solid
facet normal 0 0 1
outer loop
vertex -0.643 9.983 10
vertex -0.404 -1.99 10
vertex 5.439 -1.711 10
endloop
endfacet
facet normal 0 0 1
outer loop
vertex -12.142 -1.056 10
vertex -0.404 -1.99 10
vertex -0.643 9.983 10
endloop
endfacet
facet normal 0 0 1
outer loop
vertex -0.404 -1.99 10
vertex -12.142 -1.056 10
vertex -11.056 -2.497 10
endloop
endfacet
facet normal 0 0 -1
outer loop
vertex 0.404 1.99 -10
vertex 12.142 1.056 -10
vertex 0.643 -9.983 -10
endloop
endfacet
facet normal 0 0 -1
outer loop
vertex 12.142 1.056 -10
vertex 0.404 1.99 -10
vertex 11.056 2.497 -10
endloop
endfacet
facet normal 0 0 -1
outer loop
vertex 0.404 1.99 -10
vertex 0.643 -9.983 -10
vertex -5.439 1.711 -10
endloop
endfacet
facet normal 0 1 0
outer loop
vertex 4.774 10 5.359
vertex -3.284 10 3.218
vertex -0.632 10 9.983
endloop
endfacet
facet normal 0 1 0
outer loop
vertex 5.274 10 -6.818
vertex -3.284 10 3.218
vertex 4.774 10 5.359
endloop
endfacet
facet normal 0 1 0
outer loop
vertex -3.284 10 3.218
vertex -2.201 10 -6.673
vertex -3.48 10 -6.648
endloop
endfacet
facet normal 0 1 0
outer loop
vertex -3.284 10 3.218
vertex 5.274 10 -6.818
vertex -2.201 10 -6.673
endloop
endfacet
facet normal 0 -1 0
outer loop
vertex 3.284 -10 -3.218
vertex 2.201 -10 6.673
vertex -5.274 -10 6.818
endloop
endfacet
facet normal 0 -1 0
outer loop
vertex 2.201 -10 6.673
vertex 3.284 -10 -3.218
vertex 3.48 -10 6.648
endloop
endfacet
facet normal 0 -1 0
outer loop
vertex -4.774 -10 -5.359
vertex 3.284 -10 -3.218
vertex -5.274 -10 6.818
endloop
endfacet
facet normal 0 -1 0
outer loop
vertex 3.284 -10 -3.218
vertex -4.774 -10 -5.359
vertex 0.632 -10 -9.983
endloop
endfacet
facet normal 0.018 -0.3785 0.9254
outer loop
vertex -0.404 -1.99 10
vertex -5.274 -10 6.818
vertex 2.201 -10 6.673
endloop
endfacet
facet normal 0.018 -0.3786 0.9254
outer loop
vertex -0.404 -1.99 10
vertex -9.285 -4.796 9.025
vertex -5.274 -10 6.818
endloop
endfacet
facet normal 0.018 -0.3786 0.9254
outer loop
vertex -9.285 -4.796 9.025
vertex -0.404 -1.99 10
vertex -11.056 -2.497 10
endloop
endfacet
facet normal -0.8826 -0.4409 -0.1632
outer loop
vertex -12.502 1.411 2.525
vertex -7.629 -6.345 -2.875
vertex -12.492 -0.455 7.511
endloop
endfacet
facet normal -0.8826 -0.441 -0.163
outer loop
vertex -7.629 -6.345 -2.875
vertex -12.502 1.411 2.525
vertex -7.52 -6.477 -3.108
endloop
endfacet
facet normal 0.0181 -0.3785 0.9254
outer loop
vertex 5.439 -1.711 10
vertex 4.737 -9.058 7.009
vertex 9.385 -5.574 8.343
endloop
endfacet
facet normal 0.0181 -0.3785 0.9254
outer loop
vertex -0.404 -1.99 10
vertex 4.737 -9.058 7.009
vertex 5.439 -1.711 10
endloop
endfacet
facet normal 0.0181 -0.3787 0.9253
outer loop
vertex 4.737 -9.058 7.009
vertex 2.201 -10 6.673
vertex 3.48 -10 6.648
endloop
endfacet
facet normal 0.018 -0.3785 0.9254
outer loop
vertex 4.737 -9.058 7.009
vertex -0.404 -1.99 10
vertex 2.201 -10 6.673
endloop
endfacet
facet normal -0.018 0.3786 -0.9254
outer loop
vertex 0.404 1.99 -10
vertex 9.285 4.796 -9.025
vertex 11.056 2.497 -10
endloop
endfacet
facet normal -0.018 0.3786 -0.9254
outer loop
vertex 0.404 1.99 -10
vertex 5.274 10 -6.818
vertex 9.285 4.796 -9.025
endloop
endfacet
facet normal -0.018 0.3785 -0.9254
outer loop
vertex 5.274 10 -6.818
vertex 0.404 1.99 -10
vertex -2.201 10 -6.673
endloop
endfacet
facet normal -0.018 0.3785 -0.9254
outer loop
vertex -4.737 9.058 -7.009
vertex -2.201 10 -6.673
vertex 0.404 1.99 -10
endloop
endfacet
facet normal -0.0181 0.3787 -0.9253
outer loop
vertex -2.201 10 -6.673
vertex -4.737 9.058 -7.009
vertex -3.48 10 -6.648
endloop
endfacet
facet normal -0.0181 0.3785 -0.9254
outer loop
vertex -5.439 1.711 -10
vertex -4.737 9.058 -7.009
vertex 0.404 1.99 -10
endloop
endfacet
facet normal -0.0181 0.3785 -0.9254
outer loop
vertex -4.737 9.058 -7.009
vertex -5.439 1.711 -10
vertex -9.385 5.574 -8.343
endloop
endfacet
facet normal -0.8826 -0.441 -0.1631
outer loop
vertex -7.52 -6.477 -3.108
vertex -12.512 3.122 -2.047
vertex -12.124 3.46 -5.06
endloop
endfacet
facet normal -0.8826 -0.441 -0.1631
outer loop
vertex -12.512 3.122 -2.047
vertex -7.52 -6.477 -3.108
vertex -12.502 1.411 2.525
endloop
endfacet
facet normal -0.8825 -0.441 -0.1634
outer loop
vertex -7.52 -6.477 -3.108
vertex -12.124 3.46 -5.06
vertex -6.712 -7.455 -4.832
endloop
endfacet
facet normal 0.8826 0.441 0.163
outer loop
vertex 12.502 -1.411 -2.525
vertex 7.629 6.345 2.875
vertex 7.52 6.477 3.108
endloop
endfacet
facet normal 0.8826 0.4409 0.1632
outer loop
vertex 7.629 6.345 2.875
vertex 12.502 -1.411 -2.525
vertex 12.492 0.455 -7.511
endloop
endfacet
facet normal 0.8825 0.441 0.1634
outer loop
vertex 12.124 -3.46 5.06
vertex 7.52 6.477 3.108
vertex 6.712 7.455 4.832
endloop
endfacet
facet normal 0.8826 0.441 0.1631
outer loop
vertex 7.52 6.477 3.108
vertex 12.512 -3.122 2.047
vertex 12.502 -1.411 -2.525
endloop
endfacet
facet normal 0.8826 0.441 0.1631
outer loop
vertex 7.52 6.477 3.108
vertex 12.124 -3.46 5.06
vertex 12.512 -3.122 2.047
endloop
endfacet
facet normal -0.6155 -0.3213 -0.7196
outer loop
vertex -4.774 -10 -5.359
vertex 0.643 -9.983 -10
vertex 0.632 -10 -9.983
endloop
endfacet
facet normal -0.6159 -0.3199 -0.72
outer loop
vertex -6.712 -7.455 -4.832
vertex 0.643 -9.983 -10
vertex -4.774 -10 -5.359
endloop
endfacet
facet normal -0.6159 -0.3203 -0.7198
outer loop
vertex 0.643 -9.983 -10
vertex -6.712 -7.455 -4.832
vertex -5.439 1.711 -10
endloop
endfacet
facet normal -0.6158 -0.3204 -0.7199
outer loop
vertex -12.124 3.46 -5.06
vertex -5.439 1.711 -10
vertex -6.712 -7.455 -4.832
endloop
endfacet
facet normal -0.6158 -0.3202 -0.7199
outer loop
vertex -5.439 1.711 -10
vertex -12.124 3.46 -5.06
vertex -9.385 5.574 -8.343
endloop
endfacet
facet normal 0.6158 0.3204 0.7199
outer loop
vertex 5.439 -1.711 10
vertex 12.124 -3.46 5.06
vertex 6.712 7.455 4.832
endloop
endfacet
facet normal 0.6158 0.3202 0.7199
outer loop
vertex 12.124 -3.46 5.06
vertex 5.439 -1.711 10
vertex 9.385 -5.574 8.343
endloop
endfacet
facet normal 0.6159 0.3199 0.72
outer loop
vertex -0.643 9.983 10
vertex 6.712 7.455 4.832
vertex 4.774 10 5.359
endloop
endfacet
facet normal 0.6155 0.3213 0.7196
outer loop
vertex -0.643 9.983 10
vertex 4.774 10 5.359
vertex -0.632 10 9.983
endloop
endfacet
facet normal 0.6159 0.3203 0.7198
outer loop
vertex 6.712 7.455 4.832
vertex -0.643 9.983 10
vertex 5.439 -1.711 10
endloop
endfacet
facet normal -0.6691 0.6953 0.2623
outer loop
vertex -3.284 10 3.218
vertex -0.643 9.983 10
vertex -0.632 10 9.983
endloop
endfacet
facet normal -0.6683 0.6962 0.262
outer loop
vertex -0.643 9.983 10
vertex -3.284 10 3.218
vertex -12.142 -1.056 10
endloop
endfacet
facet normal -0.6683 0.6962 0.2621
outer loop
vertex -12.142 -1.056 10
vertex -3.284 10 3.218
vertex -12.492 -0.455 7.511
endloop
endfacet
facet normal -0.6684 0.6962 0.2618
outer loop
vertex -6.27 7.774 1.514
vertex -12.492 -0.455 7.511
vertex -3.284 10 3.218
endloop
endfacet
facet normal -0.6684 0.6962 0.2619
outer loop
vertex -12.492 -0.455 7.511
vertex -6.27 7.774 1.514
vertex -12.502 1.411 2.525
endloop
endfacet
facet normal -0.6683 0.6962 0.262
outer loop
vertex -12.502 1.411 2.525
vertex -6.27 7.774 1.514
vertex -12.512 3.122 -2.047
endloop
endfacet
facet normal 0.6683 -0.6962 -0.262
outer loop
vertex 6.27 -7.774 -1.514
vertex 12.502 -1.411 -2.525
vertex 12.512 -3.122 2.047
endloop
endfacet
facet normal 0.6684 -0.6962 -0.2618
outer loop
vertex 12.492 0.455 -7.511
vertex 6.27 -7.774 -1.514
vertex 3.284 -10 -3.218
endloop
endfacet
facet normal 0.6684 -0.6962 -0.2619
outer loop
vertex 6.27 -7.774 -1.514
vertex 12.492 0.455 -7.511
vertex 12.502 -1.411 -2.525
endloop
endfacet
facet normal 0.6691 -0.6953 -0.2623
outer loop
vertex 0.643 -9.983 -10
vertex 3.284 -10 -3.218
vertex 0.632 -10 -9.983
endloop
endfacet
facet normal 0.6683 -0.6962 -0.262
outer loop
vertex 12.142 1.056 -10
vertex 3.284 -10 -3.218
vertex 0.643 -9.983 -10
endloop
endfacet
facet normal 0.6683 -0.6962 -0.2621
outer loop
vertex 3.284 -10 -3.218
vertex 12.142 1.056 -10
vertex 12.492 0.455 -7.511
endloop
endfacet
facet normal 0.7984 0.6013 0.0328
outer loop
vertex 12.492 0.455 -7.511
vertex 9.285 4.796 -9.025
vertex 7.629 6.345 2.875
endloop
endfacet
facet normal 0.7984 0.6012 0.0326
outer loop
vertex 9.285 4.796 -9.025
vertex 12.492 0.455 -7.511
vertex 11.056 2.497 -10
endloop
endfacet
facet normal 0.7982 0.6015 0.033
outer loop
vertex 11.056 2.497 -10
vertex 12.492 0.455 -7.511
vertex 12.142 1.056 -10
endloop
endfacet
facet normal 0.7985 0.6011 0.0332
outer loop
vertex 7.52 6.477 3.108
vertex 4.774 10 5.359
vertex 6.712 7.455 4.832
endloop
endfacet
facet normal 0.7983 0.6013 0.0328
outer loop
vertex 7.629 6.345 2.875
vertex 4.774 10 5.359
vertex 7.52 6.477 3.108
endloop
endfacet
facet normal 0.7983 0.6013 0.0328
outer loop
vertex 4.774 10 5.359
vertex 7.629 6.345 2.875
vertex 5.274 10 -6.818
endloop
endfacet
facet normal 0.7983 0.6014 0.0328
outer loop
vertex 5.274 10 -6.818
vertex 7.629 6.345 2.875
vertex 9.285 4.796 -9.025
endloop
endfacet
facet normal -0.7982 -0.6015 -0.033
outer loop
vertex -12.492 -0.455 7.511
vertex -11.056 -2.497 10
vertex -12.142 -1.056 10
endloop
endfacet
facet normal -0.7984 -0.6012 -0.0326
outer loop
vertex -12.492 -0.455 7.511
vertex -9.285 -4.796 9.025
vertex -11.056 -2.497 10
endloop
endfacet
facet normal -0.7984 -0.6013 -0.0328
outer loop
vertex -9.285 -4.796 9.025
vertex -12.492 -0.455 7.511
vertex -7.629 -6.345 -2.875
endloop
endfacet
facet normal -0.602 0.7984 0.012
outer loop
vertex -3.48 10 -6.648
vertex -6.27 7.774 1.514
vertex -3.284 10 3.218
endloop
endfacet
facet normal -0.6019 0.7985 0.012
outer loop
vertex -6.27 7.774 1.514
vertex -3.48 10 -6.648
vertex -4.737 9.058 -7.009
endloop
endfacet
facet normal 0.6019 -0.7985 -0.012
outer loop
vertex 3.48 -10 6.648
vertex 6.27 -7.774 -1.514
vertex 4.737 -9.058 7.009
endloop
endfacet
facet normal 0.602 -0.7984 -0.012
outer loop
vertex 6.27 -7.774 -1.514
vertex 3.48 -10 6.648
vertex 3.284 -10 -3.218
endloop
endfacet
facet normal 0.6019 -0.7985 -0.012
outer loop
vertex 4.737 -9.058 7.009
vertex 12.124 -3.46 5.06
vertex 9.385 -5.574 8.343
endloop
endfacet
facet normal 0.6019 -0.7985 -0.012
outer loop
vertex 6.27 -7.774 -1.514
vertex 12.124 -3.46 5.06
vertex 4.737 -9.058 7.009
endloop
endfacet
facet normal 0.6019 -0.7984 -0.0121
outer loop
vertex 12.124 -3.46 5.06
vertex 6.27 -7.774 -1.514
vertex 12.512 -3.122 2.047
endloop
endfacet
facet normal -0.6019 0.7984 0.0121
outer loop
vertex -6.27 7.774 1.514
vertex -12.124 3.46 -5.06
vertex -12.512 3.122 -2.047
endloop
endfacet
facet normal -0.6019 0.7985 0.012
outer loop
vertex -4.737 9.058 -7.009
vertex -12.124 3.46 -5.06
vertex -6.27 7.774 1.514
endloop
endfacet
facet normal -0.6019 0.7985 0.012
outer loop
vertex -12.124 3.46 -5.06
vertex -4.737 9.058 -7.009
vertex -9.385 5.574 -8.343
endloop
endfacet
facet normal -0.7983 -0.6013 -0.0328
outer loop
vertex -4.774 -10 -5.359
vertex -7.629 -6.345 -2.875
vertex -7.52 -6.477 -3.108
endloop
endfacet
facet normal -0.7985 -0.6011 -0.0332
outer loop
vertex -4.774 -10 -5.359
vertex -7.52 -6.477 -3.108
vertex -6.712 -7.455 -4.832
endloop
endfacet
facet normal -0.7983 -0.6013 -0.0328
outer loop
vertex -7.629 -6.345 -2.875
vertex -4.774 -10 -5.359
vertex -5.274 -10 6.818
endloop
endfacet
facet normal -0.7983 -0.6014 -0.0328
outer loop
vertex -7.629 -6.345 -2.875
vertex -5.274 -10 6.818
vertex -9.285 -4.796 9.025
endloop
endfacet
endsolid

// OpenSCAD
intersection_for(i = [ [  0,  0,   0],
                        [ 10, 20, 300],
                        [200, 40,  57],
                        [ 20, 88,  57] ])
{
    rotate(i)
    cube([100, 20, 20], center = true);
}
